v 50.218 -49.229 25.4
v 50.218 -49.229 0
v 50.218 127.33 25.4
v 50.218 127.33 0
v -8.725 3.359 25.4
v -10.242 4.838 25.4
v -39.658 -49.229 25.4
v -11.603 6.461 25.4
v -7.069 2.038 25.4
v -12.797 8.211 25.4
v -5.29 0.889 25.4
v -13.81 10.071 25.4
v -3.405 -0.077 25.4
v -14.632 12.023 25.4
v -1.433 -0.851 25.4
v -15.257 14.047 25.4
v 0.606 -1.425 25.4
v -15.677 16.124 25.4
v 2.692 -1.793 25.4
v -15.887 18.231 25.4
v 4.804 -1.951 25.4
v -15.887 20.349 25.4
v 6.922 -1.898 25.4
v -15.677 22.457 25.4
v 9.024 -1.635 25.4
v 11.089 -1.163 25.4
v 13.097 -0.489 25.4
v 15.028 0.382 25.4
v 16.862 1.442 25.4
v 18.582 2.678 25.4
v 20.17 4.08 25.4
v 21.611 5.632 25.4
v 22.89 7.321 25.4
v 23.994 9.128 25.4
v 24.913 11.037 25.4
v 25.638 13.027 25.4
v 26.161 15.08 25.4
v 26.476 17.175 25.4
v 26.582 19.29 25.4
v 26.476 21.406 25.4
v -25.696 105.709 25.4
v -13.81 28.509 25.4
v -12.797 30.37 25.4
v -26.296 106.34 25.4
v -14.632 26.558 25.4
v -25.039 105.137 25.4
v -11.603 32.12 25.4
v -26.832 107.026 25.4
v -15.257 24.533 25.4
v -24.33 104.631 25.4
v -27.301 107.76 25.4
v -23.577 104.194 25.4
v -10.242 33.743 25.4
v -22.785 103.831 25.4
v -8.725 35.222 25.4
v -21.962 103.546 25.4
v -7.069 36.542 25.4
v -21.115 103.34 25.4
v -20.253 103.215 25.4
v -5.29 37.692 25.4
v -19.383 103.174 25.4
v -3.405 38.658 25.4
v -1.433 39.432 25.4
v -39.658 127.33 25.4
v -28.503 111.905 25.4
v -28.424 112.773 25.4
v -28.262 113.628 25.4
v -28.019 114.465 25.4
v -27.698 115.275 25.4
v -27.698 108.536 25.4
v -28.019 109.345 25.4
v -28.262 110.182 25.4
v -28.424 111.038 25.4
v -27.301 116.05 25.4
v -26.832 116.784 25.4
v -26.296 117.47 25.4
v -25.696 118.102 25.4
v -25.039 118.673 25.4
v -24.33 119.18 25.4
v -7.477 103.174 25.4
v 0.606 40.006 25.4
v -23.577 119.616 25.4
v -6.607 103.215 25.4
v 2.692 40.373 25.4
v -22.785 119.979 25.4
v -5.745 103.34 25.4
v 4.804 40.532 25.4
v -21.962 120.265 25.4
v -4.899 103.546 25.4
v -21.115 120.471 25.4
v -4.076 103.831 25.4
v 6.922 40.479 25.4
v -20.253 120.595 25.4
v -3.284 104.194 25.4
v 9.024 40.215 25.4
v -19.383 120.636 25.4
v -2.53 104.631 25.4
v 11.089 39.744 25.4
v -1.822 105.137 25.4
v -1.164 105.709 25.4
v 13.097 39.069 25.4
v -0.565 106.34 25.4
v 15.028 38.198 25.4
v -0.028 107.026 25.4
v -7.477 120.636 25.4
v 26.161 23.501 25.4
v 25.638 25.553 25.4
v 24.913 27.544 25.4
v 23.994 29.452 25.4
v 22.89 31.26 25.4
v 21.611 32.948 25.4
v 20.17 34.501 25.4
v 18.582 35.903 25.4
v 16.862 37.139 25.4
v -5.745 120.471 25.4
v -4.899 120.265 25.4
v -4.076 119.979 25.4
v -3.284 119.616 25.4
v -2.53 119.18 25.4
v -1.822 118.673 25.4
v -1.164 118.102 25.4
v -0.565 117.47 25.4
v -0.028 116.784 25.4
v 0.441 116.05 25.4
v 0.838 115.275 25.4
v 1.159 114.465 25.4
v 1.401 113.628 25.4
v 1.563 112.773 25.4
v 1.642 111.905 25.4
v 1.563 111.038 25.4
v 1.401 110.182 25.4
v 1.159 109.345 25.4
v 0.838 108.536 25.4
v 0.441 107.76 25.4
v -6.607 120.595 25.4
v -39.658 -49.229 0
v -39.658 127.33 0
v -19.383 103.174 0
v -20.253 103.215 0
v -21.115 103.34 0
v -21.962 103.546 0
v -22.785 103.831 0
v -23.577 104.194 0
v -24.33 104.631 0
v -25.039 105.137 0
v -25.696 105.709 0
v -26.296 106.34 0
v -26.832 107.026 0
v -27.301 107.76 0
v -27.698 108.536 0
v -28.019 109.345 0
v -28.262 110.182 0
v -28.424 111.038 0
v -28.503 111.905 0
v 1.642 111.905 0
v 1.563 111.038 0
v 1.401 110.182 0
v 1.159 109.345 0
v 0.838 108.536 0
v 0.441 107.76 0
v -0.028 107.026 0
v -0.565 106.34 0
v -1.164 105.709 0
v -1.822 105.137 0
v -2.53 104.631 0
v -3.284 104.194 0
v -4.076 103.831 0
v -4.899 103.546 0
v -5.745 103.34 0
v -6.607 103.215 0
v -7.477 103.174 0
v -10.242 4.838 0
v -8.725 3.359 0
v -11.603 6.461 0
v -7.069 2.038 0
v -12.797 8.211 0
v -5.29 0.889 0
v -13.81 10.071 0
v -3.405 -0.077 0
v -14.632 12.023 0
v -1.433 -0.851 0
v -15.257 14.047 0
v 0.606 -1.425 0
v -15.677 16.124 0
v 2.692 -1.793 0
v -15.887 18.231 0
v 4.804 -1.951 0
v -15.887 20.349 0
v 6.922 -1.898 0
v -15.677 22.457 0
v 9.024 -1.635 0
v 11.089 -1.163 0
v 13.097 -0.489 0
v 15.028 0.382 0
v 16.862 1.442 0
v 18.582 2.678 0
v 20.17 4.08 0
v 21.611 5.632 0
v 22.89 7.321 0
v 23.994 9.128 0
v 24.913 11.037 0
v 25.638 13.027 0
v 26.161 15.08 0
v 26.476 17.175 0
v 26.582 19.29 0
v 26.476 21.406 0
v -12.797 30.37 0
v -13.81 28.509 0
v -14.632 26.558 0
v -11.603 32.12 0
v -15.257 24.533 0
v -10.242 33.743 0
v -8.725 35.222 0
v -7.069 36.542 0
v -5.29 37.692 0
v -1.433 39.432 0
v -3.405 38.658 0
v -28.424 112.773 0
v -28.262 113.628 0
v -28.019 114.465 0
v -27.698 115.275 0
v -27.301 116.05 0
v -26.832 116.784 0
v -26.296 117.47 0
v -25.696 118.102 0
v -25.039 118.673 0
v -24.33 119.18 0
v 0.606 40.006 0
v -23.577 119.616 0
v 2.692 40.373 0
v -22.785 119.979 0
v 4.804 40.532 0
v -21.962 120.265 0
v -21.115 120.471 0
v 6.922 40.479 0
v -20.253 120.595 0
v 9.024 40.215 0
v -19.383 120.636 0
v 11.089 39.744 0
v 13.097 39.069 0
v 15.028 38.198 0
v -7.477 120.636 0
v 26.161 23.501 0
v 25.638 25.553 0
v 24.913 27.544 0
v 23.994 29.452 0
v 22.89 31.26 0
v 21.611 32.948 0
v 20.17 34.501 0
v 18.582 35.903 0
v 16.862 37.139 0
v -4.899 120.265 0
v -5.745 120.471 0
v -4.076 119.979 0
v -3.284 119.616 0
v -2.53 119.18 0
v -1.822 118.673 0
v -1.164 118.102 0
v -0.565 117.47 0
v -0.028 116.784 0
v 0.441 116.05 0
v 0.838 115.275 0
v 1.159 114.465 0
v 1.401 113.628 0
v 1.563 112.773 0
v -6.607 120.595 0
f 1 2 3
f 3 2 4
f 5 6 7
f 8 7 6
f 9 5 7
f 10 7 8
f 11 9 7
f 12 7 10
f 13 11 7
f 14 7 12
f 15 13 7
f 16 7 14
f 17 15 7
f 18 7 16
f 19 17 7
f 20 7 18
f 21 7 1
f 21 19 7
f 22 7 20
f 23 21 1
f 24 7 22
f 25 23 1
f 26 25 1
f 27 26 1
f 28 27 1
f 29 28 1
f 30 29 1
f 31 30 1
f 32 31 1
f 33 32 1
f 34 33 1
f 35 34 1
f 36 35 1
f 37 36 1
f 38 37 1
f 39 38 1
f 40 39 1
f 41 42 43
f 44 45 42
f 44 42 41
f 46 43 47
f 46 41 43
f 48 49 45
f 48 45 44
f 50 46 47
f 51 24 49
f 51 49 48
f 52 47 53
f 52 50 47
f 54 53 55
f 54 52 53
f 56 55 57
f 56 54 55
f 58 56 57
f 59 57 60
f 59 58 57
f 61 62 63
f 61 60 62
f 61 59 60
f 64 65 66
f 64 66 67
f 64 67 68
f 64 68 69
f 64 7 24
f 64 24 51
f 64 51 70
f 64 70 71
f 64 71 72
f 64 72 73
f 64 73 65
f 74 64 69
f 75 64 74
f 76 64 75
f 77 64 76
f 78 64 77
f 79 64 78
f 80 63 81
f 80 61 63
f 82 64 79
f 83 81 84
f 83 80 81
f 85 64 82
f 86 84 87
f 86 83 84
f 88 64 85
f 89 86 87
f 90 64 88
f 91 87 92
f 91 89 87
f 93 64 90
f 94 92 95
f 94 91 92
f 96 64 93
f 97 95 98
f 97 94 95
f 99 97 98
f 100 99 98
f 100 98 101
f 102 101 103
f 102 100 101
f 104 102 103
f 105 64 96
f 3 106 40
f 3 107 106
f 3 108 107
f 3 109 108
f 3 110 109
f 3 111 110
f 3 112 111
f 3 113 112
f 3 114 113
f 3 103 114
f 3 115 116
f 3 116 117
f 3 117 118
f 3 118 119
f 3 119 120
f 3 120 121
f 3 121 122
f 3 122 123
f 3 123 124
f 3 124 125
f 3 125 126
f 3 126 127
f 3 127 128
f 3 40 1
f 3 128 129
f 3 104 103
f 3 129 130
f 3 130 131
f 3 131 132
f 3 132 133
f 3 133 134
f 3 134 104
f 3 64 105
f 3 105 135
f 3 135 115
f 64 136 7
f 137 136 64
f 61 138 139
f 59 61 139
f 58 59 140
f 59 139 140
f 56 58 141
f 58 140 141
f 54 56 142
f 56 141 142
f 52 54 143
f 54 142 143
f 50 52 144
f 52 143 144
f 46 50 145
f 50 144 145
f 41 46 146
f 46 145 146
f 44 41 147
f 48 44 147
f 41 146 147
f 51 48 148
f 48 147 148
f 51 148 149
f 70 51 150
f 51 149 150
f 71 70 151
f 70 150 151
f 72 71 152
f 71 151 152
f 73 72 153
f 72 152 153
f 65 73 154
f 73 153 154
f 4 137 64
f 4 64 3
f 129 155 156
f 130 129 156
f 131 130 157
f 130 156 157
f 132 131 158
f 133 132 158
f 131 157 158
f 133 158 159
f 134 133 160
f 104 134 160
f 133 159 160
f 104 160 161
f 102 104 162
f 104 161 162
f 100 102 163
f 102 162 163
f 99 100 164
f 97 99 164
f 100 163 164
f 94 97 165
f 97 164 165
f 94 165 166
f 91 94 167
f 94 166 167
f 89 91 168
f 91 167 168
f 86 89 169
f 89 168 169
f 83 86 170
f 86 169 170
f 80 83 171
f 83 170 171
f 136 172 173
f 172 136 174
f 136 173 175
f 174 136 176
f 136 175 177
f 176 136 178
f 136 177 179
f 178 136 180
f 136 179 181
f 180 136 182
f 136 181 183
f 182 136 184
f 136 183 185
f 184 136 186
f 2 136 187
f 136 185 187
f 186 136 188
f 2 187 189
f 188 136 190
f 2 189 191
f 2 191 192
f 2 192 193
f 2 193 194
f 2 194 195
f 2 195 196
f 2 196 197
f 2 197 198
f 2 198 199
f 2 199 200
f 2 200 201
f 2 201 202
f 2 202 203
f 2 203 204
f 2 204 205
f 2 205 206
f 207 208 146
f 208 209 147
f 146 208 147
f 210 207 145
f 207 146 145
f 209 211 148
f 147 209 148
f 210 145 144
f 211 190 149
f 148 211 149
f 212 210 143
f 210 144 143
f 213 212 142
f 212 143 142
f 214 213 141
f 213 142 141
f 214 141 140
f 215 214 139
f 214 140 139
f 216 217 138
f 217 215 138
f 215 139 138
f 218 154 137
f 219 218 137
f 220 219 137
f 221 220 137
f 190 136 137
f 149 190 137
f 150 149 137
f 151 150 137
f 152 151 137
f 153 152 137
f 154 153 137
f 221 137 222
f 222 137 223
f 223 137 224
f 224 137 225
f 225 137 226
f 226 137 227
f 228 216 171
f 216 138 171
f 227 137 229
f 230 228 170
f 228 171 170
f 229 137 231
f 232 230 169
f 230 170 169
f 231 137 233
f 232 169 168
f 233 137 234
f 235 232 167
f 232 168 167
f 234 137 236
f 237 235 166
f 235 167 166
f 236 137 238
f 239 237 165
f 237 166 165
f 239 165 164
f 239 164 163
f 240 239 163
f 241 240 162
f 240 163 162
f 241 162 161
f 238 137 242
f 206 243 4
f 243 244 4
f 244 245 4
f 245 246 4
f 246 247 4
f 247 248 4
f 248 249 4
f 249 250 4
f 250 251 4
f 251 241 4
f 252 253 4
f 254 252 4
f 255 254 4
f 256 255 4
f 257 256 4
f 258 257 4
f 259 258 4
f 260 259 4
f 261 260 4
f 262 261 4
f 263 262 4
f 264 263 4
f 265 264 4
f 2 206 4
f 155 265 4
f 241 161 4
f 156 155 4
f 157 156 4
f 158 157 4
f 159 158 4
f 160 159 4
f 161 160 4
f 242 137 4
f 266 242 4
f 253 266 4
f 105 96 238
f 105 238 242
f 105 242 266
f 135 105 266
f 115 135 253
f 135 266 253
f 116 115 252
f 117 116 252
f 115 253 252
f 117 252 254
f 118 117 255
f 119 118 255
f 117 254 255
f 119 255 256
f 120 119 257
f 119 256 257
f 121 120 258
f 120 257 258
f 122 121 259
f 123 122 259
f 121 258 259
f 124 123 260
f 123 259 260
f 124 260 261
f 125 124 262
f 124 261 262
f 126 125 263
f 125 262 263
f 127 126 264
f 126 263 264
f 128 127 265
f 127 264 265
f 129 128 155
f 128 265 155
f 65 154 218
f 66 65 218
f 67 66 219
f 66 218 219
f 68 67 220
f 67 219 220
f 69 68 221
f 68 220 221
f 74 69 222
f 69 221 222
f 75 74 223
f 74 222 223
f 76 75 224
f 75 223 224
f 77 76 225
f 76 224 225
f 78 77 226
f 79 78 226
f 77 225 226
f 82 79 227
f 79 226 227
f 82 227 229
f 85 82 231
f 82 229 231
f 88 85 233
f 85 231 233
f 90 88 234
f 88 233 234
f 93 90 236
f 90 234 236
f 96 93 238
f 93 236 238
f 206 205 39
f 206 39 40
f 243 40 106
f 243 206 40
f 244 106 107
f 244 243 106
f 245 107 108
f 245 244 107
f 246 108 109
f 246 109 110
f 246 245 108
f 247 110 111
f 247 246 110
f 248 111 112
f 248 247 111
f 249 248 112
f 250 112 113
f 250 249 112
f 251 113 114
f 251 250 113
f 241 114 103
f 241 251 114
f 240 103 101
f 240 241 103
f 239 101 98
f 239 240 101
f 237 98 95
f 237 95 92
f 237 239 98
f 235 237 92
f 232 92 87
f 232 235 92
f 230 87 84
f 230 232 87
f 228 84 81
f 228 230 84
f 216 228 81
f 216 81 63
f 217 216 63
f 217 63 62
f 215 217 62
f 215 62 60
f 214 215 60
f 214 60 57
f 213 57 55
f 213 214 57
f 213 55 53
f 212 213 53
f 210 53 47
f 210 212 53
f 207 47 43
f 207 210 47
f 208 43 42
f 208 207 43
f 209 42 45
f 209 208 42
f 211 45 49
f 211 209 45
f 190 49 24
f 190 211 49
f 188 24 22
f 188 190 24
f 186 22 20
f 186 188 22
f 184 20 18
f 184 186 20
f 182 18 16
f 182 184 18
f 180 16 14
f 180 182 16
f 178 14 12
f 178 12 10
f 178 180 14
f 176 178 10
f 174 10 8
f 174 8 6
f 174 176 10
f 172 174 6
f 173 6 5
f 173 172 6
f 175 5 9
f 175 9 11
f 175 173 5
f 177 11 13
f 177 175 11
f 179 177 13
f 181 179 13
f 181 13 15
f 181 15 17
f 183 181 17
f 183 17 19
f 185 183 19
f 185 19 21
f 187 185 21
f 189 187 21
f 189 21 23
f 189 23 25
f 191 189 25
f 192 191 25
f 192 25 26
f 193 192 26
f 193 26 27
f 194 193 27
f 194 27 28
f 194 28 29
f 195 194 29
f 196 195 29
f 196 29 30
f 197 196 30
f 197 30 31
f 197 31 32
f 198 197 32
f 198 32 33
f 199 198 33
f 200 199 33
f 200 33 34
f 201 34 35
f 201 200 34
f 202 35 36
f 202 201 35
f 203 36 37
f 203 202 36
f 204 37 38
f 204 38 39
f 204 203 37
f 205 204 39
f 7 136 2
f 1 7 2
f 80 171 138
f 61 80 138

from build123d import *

# Parameters (mm, degrees)
F0_W     = 89.875921
F0_H     = 176.559519
F0_R     = 21.247903
F1_DEPTH = 25.4


with BuildPart() as f1:
    # F0 (on Top) → F1 (new body)
    with BuildSketch(Plane.XY):
        with Locations((5.27959, 39.050722)):
            Rectangle(F0_W, F0_H)
        with Locations((5.334, 19.290369)):
            Circle(F0_R, mode=Mode.SUBTRACT)
        with BuildLine():
            Line((-7.477125, 103.173869), (-19.383375, 103.173869))
            ThreePointArc((-19.383375, 103.173869), (-25.696058, 105.708611), (-28.502868, 111.905119))
            ThreePointArc((-28.502868, 111.905119), (-25.696058, 118.101627), (-19.383375, 120.636369))
            Line((-19.383375, 120.636369), (-7.477125, 120.636369))
            ThreePointArc((-7.477125, 120.636369), (-1.164442, 118.101627), (1.642368, 111.905119))
            ThreePointArc((1.642368, 111.905119), (-1.164442, 105.708611), (-7.477125, 103.173869))
        make_face(mode=Mode.SUBTRACT)
    extrude(amount=F1_DEPTH)


solid = f1.part
